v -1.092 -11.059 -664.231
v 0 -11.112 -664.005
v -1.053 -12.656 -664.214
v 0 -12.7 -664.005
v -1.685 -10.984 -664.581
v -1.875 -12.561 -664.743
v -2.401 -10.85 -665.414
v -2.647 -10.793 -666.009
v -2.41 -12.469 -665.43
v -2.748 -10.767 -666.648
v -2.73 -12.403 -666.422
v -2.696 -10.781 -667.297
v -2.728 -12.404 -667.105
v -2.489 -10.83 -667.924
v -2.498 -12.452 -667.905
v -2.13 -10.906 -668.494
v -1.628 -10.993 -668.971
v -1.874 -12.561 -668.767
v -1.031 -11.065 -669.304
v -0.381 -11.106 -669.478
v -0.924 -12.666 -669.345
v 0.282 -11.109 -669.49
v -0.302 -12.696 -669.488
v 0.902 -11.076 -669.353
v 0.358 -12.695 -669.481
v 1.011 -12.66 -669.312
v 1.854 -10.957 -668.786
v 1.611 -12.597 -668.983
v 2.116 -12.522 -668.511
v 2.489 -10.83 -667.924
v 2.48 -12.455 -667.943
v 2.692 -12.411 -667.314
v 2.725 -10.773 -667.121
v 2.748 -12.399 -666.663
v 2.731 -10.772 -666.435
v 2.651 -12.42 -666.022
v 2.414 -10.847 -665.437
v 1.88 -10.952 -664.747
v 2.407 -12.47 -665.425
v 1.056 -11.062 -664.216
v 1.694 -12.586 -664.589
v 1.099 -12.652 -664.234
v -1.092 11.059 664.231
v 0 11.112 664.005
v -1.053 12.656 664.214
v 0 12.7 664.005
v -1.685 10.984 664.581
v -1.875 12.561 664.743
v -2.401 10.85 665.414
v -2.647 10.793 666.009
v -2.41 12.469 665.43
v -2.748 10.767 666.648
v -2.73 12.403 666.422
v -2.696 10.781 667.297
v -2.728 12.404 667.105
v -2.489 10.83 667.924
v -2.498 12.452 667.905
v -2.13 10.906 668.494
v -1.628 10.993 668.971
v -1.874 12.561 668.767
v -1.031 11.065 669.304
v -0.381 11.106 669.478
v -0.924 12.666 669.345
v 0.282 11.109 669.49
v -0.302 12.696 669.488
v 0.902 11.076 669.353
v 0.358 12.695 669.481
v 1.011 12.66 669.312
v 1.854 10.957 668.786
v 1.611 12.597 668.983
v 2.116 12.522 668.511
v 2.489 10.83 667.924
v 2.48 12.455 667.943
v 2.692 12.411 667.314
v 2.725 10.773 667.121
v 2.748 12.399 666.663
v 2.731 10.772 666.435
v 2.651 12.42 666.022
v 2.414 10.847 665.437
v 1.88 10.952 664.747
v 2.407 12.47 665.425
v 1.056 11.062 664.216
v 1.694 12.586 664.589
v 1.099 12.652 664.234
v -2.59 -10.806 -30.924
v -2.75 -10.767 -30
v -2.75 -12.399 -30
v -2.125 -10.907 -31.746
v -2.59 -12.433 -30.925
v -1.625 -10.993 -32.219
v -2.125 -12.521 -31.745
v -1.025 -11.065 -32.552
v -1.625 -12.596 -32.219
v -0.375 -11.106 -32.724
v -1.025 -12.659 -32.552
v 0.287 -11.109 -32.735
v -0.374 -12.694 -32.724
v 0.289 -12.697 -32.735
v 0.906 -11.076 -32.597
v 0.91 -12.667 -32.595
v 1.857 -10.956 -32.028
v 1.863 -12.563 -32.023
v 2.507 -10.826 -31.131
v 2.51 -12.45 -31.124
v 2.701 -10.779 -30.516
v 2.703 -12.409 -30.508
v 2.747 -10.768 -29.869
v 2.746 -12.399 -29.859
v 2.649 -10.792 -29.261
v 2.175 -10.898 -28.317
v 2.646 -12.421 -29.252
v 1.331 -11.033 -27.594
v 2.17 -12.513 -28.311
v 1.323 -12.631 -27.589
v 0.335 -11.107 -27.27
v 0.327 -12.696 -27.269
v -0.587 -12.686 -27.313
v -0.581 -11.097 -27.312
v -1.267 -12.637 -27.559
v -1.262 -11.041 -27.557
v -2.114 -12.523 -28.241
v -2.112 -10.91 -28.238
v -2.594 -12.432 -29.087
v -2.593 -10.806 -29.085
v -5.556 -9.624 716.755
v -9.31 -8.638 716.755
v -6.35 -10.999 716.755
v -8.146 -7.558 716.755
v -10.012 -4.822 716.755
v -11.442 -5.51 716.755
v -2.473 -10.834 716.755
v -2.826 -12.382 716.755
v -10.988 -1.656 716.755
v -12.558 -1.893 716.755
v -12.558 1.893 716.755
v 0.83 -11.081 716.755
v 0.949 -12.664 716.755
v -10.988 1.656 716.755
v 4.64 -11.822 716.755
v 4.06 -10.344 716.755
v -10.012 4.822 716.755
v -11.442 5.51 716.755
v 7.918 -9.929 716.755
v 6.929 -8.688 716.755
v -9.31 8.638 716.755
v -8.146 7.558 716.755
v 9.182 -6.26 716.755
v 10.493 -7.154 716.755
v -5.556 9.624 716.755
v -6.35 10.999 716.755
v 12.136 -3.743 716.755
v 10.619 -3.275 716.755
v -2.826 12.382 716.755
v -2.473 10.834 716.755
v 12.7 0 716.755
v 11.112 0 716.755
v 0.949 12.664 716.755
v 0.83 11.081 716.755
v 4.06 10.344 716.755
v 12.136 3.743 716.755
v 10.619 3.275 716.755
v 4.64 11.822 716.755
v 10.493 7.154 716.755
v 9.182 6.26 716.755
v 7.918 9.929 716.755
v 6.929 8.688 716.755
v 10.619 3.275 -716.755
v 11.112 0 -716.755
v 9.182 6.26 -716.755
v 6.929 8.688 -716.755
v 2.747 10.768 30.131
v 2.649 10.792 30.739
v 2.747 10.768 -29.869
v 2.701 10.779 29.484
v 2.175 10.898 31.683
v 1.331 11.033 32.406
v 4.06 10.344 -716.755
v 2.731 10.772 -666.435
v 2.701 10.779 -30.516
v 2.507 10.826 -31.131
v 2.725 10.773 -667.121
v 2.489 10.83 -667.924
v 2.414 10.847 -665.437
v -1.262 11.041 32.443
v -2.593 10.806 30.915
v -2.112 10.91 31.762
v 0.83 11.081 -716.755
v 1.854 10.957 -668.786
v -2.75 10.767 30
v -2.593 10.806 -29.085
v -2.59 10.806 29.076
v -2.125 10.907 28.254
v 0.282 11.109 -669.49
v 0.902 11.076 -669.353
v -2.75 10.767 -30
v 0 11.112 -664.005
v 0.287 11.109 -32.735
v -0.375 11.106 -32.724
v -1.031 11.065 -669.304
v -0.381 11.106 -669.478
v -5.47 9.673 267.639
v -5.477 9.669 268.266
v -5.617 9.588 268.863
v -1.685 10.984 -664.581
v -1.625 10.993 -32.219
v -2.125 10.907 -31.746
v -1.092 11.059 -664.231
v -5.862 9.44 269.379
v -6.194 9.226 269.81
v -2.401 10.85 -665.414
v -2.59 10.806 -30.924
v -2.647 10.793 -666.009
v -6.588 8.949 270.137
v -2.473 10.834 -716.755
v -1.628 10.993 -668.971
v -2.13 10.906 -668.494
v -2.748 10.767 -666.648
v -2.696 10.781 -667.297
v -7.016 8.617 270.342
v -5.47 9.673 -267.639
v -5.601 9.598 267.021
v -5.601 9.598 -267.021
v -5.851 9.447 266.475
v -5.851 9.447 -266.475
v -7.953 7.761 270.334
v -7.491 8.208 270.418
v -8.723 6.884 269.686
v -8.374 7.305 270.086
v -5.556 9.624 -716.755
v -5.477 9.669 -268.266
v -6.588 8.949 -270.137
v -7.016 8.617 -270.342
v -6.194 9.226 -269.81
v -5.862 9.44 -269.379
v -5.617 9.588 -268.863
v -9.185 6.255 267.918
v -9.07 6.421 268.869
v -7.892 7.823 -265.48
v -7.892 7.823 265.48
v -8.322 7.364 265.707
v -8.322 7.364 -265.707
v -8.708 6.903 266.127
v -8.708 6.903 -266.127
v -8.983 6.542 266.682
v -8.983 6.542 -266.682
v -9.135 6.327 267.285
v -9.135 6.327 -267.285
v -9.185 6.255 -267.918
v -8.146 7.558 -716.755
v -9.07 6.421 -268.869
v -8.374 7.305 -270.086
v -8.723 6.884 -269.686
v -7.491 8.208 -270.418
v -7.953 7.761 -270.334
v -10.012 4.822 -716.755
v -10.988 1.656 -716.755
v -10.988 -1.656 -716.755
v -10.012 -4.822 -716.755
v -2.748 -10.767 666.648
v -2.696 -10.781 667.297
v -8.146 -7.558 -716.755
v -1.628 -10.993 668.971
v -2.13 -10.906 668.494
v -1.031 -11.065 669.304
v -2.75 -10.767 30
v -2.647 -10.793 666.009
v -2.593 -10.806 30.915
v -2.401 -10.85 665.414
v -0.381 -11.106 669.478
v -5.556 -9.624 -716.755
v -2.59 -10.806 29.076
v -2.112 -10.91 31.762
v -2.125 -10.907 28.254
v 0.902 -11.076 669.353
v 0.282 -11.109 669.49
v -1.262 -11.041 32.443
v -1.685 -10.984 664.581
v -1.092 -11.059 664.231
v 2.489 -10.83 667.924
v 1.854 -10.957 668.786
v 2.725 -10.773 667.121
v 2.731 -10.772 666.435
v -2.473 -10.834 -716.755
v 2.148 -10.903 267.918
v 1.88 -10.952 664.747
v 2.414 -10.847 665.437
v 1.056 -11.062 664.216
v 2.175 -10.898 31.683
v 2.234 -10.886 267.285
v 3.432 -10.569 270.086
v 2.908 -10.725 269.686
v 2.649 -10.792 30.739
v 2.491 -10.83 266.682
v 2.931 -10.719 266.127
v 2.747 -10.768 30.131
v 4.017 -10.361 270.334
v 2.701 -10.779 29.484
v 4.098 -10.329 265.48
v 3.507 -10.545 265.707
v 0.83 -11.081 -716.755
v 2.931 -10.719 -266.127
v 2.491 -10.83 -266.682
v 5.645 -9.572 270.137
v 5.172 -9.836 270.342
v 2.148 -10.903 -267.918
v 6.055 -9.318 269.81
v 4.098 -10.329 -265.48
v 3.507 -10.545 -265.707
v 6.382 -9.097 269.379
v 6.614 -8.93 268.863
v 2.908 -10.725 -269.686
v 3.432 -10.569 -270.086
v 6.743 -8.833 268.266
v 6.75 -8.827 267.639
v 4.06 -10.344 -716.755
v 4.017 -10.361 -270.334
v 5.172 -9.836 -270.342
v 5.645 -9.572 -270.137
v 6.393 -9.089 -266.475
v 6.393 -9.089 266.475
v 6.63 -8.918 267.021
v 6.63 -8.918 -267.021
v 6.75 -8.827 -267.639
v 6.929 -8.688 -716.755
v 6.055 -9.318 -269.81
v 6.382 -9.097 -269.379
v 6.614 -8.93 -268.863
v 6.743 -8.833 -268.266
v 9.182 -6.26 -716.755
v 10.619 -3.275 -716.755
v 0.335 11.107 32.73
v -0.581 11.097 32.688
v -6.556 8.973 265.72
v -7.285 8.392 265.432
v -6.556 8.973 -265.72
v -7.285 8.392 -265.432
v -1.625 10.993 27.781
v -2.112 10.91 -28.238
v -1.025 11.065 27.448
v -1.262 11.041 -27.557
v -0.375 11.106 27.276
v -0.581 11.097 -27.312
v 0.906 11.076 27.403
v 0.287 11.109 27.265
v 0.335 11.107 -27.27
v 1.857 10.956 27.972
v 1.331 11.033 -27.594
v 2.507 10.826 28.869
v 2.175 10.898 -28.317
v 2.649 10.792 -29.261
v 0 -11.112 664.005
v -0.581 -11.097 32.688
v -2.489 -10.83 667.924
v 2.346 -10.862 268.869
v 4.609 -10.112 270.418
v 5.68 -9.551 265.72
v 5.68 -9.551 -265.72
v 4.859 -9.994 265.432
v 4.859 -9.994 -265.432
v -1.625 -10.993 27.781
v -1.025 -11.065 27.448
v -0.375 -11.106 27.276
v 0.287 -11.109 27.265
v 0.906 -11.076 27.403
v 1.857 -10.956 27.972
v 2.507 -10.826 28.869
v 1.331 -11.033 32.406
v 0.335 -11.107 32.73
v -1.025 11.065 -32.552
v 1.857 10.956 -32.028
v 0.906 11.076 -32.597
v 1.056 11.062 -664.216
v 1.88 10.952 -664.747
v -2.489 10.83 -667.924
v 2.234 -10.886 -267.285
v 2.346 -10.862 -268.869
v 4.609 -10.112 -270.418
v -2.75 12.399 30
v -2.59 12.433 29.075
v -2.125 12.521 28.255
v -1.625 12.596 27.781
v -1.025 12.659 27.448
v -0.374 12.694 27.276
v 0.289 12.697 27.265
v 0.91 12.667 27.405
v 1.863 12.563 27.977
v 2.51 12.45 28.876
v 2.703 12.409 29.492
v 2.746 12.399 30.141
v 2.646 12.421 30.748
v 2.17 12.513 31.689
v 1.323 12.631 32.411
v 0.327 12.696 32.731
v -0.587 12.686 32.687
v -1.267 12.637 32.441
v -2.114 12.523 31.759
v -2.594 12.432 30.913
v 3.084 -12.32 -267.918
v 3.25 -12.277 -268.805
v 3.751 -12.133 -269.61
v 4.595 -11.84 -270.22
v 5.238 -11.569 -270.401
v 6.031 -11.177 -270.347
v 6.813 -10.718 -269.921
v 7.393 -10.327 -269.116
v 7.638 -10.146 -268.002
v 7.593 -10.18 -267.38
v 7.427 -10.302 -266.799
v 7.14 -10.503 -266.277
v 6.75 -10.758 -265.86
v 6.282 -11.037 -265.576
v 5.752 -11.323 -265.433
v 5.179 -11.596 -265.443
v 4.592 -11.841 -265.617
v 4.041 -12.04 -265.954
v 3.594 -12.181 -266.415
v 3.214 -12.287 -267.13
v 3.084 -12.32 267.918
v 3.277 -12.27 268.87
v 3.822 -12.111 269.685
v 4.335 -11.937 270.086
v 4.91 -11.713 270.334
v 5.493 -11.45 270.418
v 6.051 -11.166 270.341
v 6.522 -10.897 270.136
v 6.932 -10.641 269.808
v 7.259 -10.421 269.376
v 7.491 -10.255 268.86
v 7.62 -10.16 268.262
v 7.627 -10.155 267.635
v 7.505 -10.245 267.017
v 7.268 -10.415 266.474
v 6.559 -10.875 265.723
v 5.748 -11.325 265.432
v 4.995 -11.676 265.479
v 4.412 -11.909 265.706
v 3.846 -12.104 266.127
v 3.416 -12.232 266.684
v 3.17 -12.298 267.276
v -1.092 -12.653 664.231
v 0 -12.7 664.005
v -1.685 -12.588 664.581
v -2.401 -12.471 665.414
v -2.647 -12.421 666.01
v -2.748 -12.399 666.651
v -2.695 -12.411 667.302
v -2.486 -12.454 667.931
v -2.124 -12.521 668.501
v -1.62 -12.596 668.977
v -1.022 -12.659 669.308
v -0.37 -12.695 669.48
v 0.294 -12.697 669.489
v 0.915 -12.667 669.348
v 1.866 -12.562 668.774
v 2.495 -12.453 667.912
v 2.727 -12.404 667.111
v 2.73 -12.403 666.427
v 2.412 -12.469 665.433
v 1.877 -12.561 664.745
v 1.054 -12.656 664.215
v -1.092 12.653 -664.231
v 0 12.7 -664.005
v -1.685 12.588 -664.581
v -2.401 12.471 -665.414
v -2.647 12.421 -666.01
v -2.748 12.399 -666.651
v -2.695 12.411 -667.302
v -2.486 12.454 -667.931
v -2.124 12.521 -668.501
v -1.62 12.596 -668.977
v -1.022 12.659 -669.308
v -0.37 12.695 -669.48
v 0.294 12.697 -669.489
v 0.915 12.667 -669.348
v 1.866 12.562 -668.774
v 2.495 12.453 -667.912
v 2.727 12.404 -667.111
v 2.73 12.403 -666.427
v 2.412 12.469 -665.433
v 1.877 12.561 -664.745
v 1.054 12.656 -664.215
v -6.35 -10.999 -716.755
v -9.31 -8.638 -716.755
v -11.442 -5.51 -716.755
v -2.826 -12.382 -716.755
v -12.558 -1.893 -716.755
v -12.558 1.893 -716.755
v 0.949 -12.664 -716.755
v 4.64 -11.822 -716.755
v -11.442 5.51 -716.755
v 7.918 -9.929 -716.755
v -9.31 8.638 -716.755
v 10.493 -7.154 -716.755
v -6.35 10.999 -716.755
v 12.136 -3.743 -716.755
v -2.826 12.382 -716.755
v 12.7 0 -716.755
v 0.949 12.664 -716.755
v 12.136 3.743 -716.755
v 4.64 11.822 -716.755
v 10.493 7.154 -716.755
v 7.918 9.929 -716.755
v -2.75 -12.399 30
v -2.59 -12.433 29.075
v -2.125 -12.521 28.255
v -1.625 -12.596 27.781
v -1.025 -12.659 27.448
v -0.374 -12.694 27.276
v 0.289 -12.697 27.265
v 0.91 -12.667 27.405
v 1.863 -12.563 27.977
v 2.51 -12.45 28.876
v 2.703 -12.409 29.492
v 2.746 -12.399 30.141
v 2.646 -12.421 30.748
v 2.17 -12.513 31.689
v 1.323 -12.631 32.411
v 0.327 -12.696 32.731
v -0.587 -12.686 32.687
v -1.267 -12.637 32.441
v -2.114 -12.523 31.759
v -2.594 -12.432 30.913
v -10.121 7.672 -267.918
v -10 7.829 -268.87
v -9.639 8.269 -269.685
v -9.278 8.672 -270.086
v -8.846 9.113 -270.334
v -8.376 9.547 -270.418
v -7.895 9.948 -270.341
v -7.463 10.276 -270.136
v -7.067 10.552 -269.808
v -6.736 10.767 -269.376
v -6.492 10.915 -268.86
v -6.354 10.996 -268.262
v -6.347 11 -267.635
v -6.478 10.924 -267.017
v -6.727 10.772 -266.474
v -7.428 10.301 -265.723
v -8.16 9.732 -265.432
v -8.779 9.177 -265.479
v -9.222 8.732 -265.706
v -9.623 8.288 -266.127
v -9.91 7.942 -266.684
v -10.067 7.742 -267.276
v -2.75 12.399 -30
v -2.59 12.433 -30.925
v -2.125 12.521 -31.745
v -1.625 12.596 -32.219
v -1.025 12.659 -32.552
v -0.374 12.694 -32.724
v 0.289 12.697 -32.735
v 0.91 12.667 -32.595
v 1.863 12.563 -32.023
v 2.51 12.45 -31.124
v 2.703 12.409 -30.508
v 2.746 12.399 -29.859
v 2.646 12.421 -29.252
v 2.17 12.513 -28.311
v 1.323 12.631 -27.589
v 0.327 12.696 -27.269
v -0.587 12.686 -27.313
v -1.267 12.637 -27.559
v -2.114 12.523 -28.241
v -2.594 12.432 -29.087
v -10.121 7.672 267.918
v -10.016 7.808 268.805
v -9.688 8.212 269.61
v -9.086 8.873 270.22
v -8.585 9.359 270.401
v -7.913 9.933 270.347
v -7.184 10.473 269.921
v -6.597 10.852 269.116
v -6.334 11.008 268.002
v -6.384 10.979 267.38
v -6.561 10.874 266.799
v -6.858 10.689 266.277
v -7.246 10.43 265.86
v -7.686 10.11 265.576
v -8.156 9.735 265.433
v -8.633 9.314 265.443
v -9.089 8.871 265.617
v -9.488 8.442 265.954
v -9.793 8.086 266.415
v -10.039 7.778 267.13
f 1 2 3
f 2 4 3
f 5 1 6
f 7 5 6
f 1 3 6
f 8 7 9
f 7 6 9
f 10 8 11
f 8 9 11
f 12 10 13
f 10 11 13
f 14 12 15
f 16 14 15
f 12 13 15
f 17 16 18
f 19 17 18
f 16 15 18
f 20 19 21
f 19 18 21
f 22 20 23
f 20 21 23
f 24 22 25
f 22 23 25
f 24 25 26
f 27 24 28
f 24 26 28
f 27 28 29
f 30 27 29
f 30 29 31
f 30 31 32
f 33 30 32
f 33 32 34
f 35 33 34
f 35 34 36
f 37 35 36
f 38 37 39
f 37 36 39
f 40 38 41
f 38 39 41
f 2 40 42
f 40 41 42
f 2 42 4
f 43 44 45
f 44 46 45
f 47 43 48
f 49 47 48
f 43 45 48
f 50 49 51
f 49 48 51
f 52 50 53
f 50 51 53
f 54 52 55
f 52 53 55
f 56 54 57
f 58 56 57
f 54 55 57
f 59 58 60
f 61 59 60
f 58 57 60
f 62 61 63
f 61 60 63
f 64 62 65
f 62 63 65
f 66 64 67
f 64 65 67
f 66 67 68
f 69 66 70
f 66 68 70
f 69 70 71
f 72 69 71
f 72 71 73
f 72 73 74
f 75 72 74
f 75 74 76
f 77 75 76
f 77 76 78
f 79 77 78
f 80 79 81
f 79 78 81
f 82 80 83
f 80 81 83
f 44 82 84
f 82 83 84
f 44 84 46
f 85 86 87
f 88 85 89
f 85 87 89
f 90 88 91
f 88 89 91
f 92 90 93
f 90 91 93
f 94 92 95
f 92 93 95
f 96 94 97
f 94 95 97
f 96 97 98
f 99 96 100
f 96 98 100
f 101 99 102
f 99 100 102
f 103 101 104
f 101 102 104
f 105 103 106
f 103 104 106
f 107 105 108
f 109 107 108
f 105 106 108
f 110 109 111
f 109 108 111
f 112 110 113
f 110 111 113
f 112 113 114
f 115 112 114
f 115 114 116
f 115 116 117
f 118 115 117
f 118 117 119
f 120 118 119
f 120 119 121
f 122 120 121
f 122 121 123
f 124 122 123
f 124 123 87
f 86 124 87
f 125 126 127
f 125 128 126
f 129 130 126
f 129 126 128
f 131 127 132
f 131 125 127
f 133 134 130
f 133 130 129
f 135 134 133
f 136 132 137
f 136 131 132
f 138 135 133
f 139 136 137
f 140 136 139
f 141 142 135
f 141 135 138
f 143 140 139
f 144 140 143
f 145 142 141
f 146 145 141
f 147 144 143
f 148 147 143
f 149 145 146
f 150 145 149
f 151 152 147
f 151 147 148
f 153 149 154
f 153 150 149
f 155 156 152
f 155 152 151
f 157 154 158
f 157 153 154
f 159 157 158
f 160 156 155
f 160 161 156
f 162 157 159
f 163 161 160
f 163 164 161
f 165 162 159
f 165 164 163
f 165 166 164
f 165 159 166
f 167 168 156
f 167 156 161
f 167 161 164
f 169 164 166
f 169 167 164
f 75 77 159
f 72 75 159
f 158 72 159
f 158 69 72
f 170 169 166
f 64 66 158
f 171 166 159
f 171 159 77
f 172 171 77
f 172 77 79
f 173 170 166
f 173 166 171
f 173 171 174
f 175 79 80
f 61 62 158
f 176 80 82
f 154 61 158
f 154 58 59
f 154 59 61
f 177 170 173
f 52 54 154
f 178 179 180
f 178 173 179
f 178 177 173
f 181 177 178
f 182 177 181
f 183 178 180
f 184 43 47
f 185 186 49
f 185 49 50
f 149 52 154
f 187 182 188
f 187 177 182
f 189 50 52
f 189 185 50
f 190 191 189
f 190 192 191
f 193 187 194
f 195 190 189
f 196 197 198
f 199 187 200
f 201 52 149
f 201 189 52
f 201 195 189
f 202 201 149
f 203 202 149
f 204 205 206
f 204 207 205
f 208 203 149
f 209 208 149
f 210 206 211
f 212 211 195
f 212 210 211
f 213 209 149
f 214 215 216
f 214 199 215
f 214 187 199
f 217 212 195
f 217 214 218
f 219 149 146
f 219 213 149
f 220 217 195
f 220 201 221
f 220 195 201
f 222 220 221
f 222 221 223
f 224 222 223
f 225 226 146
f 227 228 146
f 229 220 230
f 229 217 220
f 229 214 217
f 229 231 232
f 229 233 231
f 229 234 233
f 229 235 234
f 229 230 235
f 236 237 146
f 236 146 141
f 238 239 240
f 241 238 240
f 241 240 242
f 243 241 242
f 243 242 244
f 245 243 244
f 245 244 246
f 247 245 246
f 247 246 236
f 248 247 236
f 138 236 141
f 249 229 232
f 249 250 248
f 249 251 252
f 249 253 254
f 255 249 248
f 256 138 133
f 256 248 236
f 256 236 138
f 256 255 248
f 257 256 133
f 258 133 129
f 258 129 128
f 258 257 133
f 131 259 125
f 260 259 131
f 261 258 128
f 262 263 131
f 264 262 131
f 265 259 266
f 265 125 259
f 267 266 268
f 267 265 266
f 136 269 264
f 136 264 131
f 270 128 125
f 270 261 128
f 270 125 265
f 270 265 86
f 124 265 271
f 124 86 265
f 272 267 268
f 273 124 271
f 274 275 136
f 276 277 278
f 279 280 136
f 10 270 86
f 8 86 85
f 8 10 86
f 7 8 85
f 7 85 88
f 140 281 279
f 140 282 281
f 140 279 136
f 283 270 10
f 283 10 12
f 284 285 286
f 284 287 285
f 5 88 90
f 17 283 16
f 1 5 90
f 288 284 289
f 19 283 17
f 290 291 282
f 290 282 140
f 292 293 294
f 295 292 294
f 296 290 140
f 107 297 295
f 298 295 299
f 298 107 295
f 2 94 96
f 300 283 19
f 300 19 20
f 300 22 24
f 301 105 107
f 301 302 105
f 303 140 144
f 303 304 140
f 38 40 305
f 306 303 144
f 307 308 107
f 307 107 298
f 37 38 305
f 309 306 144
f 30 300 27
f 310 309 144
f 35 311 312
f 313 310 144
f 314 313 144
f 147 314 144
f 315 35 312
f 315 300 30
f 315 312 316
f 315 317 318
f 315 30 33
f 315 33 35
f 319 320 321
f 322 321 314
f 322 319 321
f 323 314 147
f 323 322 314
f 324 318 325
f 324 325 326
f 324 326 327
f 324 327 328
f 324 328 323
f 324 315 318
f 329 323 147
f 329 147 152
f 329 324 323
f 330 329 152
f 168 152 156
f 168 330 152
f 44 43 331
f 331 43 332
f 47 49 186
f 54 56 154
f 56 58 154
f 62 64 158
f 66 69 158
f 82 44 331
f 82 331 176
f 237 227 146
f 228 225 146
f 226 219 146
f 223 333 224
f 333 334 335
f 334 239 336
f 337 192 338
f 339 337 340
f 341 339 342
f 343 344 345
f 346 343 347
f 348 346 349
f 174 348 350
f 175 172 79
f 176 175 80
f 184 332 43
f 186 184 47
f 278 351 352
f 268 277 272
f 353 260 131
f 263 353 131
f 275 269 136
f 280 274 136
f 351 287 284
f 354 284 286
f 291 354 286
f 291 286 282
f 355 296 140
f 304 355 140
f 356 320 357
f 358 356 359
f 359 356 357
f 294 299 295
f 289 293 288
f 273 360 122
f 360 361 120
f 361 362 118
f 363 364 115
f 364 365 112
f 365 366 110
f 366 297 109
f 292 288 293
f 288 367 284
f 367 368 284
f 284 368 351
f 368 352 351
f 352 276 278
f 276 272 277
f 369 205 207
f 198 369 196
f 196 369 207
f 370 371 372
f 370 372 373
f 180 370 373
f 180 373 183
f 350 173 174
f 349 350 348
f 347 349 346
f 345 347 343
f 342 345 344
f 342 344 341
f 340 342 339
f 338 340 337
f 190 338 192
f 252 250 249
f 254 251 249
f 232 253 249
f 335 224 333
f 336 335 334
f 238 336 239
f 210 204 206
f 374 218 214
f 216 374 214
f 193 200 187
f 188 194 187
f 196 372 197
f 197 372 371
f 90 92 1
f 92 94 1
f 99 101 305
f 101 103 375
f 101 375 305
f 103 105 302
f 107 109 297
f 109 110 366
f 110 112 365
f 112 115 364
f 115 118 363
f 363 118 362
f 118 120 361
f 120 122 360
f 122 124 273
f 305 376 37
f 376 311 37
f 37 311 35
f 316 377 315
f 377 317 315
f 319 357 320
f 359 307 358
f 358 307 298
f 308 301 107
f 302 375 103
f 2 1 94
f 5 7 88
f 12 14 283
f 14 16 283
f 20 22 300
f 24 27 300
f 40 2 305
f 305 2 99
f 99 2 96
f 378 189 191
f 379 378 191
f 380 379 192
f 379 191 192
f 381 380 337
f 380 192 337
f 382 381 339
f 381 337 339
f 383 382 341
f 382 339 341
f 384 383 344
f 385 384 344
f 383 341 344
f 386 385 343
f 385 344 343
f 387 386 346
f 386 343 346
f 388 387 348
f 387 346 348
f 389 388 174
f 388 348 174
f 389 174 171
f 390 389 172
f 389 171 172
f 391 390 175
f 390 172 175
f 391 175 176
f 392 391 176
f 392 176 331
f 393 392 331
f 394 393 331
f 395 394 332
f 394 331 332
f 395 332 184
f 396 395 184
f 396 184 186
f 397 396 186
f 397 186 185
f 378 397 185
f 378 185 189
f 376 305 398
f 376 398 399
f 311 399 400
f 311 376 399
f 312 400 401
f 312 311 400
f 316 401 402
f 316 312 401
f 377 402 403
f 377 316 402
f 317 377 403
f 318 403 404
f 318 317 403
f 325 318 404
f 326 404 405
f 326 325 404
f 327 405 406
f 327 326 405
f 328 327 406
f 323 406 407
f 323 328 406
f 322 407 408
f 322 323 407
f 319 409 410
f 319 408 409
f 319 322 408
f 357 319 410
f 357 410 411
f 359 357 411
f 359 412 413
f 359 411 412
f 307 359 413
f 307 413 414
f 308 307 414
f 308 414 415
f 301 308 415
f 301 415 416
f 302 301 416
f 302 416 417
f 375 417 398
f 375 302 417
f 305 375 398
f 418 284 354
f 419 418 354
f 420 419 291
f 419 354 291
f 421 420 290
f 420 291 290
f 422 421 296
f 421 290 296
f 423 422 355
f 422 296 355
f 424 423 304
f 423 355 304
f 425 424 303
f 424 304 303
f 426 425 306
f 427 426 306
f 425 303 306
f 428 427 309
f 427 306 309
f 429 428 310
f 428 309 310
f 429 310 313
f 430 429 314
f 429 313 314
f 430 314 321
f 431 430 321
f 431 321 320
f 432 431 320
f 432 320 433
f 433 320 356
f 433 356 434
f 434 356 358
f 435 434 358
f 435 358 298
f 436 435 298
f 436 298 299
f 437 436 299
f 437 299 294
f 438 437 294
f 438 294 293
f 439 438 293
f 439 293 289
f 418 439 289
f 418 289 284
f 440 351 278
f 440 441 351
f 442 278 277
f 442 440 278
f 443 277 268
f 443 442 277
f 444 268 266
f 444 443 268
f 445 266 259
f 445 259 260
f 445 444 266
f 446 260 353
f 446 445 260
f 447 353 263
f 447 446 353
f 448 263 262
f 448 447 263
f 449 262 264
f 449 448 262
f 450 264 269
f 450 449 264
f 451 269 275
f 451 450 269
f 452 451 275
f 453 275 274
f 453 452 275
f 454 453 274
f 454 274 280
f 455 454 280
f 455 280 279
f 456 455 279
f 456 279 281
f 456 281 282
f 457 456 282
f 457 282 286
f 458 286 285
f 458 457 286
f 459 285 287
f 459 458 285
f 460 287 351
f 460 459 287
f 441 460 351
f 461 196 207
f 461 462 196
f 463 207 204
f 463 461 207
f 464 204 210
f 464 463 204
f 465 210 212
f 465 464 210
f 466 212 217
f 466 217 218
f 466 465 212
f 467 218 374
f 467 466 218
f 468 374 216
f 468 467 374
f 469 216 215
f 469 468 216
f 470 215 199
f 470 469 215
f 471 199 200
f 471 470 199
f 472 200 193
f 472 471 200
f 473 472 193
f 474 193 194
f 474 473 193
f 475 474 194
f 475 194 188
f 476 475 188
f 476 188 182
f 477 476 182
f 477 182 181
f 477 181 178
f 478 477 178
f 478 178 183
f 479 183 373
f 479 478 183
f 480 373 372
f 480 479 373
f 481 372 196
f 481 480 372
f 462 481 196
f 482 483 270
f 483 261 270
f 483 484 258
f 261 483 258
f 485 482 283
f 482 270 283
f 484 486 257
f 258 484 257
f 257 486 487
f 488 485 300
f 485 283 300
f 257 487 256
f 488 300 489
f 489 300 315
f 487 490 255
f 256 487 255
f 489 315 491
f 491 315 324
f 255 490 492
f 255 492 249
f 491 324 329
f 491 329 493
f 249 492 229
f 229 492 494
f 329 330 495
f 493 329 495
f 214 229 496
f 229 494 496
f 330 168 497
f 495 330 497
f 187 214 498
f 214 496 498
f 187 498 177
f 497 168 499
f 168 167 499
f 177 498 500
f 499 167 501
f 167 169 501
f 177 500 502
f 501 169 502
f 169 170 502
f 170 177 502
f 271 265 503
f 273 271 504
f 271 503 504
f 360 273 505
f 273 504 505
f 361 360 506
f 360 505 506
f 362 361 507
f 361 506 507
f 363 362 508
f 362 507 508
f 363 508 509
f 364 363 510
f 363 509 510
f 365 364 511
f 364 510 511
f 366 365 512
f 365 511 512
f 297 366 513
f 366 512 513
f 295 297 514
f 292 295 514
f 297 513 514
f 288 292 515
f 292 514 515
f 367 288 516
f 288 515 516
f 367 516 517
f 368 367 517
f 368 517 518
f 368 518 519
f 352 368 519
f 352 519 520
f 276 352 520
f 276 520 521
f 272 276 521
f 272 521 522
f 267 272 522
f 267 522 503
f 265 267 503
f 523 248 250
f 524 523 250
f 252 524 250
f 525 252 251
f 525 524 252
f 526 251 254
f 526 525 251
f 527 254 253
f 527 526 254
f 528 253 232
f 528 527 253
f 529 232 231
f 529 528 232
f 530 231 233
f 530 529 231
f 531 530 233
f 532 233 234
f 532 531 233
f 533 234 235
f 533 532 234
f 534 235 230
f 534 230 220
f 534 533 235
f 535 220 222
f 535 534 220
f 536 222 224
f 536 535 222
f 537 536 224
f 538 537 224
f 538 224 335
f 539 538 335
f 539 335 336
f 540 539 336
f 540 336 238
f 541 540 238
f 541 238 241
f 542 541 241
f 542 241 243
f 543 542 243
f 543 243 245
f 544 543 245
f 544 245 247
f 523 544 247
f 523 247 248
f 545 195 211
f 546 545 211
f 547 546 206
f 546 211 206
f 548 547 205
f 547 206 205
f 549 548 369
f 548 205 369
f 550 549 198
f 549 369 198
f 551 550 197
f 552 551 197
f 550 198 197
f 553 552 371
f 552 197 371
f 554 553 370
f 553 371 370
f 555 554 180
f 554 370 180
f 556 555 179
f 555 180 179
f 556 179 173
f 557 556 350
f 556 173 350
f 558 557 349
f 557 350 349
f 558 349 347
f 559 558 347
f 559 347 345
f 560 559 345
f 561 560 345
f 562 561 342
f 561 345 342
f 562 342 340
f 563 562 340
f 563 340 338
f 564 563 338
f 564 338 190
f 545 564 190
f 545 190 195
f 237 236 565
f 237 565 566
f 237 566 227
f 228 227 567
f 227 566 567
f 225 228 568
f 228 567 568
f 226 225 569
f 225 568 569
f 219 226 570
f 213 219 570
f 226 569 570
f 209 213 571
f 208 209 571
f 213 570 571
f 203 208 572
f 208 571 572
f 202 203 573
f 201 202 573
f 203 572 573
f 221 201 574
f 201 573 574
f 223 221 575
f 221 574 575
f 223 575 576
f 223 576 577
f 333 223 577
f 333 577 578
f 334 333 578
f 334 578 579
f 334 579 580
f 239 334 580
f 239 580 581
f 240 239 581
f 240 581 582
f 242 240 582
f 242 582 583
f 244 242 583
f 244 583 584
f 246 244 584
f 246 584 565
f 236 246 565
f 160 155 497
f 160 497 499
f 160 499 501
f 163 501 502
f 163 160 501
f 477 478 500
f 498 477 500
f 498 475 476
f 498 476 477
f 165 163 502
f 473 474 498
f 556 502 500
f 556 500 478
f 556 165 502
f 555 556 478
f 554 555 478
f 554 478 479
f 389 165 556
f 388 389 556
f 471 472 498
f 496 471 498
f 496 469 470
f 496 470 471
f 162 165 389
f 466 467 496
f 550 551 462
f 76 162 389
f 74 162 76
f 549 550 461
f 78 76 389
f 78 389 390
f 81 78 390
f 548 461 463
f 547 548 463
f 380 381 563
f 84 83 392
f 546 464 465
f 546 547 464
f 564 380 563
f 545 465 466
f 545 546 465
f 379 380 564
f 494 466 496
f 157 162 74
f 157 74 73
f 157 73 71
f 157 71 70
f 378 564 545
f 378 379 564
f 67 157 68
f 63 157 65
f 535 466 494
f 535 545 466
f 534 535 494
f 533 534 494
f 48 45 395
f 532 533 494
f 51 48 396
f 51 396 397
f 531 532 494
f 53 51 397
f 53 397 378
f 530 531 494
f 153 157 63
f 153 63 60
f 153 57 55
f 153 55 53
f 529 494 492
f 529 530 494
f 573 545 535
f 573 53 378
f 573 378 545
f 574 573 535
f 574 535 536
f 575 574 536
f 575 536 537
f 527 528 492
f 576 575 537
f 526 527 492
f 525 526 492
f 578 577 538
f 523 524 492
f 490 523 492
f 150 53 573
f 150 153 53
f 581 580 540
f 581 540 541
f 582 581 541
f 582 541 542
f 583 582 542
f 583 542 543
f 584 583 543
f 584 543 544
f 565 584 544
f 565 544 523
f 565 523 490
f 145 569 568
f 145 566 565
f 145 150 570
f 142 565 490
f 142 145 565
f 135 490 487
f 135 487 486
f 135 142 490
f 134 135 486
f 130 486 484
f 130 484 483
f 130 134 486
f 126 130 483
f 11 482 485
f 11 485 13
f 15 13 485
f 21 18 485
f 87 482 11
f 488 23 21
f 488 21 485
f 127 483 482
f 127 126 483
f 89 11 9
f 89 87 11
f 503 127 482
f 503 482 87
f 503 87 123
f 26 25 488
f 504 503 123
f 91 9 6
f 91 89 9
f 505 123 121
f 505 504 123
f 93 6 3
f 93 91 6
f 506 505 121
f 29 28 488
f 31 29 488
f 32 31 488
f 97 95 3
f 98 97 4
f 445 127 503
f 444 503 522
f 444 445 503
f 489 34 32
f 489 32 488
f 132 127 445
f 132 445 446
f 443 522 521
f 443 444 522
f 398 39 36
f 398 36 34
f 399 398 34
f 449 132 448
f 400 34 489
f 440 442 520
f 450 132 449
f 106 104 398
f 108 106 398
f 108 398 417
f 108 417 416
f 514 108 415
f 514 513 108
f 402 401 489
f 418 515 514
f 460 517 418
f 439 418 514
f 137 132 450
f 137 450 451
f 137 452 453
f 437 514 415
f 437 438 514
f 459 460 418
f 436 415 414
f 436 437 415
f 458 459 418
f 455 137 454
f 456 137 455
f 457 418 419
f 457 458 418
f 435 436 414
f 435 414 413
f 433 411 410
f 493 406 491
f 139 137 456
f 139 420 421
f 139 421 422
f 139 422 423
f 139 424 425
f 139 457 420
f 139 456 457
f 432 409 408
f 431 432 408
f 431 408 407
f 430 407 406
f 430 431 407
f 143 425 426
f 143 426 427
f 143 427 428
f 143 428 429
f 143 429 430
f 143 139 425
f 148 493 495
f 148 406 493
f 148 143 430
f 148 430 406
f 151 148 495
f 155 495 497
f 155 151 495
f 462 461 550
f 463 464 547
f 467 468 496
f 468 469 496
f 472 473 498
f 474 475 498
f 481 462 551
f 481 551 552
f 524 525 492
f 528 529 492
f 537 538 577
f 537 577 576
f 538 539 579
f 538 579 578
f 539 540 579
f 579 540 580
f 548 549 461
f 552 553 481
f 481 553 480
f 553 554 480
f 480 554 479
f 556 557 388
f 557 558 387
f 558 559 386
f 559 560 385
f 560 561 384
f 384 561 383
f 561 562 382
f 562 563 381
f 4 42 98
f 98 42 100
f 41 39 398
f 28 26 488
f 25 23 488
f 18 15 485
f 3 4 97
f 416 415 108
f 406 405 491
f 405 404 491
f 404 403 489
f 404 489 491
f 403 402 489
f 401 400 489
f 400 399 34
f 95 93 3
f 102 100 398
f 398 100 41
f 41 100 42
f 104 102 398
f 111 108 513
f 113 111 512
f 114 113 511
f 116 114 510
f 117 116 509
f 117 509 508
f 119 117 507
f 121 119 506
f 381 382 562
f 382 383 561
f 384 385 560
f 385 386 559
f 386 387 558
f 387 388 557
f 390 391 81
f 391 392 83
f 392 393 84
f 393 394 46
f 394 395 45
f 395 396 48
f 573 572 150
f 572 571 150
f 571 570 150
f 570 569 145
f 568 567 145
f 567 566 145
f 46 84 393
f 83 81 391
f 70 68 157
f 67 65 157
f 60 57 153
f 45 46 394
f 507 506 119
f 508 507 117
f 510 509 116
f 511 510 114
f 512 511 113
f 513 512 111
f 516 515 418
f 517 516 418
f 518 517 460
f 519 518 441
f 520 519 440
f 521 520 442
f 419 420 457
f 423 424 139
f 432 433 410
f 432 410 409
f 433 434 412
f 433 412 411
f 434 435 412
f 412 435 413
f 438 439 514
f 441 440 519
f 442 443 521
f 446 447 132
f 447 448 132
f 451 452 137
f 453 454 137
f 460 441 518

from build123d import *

# Parameters (mm, degrees)
SKETCH1_R                                  = 12.7
SKETCH1_R_2                                = 11.1125
BOSS_EXTRUDE1_DEPTH                        = 716.7546056
M5_CLEARANCE_HOLE1_D                       = 5.5
SKETCH7_W                                  = 2.75
SKETCH7_H                                  = 12.7
MIRROR1_AT_THE_SECOND_PLANE_COPY_1_SKETC_W = 2.75
MIRROR1_AT_THE_SECOND_PLANE_COPY_1_SKETC_H = 12.7
CUT_EXTRUDE1_START                         = -12.7
SKETCH8_R                                  = 2.5
CUT_EXTRUDE1_DEPTH                         = 25.4


with BuildPart() as part:
    # Sketch1 → Boss-Extrude1 (new body, symmetric)
    with BuildSketch(Plane.XY):
        Circle(SKETCH1_R)
        Circle(SKETCH1_R_2, mode=Mode.SUBTRACT)
    extrude(amount=BOSS_EXTRUDE1_DEPTH, both=True)

    # M5 Clearance Hole1 (through all)
    with Locations(Plane(origin=(0, 12.7, 0), x_dir=(1, 0, 0), z_dir=(0, 1, 0))):
        with Locations((0, 30), (0, -30)):
            Hole(M5_CLEARANCE_HOLE1_D / 2)

    # Sketch7 → M5 Clearance Hole2 (revolve, cut)
    with BuildSketch(Plane(origin=(0, 0, 666.7546056), x_dir=(0, 0, -1), z_dir=(1, 0, 0))):
        with Locations((1.375, 6.35)):
            Rectangle(SKETCH7_W, SKETCH7_H)
    m5_clearance_hole2 = revolve(axis=Axis((0, -6.35, 666.7546056), (0, 1, 0)), mode=Mode.SUBTRACT)

    # Mirror1: M5 Clearance Hole2 across plane
    add(m5_clearance_hole2.mirror(Plane.ZX), mode=Mode.SUBTRACT)

    # Mirror1 at the second plane: M5 Clearance Hole2 across plane
    add(m5_clearance_hole2.mirror(Plane.XY), mode=Mode.SUBTRACT)

    # Mirror1 at the second plane copy 1 sketc → Mirror1 at the second plane copy 1 (revolve, cut)
    with BuildSketch(Plane(origin=(0, 0, -666.7546056), x_dir=(0, 0, 1), z_dir=(1, 0, 0))):
        with Locations((1.375, 6.35)):
            Rectangle(MIRROR1_AT_THE_SECOND_PLANE_COPY_1_SKETC_W, MIRROR1_AT_THE_SECOND_PLANE_COPY_1_SKETC_H)
    revolve(axis=Axis((0, 6.35, -666.7546056), (0, -1, 0)), mode=Mode.SUBTRACT)

    # Sketch8 → Cut-Extrude1 (cut)
    with BuildSketch(Plane(origin=(0, 0, 0), x_dir=(-0.834407926, -0.55114736, 0), z_dir=(0.55114736, -0.834407926, 0)).offset(CUT_EXTRUDE1_START)):
        with Locations((1.717033262, 267.917598195)):
            Circle(SKETCH8_R)
    cut_extrude1 = extrude(amount=CUT_EXTRUDE1_DEPTH, mode=Mode.SUBTRACT)

    # Mirror2: Cut-Extrude1 across plane
    add(cut_extrude1.mirror(Plane.XY), mode=Mode.SUBTRACT)


solid = part.part
